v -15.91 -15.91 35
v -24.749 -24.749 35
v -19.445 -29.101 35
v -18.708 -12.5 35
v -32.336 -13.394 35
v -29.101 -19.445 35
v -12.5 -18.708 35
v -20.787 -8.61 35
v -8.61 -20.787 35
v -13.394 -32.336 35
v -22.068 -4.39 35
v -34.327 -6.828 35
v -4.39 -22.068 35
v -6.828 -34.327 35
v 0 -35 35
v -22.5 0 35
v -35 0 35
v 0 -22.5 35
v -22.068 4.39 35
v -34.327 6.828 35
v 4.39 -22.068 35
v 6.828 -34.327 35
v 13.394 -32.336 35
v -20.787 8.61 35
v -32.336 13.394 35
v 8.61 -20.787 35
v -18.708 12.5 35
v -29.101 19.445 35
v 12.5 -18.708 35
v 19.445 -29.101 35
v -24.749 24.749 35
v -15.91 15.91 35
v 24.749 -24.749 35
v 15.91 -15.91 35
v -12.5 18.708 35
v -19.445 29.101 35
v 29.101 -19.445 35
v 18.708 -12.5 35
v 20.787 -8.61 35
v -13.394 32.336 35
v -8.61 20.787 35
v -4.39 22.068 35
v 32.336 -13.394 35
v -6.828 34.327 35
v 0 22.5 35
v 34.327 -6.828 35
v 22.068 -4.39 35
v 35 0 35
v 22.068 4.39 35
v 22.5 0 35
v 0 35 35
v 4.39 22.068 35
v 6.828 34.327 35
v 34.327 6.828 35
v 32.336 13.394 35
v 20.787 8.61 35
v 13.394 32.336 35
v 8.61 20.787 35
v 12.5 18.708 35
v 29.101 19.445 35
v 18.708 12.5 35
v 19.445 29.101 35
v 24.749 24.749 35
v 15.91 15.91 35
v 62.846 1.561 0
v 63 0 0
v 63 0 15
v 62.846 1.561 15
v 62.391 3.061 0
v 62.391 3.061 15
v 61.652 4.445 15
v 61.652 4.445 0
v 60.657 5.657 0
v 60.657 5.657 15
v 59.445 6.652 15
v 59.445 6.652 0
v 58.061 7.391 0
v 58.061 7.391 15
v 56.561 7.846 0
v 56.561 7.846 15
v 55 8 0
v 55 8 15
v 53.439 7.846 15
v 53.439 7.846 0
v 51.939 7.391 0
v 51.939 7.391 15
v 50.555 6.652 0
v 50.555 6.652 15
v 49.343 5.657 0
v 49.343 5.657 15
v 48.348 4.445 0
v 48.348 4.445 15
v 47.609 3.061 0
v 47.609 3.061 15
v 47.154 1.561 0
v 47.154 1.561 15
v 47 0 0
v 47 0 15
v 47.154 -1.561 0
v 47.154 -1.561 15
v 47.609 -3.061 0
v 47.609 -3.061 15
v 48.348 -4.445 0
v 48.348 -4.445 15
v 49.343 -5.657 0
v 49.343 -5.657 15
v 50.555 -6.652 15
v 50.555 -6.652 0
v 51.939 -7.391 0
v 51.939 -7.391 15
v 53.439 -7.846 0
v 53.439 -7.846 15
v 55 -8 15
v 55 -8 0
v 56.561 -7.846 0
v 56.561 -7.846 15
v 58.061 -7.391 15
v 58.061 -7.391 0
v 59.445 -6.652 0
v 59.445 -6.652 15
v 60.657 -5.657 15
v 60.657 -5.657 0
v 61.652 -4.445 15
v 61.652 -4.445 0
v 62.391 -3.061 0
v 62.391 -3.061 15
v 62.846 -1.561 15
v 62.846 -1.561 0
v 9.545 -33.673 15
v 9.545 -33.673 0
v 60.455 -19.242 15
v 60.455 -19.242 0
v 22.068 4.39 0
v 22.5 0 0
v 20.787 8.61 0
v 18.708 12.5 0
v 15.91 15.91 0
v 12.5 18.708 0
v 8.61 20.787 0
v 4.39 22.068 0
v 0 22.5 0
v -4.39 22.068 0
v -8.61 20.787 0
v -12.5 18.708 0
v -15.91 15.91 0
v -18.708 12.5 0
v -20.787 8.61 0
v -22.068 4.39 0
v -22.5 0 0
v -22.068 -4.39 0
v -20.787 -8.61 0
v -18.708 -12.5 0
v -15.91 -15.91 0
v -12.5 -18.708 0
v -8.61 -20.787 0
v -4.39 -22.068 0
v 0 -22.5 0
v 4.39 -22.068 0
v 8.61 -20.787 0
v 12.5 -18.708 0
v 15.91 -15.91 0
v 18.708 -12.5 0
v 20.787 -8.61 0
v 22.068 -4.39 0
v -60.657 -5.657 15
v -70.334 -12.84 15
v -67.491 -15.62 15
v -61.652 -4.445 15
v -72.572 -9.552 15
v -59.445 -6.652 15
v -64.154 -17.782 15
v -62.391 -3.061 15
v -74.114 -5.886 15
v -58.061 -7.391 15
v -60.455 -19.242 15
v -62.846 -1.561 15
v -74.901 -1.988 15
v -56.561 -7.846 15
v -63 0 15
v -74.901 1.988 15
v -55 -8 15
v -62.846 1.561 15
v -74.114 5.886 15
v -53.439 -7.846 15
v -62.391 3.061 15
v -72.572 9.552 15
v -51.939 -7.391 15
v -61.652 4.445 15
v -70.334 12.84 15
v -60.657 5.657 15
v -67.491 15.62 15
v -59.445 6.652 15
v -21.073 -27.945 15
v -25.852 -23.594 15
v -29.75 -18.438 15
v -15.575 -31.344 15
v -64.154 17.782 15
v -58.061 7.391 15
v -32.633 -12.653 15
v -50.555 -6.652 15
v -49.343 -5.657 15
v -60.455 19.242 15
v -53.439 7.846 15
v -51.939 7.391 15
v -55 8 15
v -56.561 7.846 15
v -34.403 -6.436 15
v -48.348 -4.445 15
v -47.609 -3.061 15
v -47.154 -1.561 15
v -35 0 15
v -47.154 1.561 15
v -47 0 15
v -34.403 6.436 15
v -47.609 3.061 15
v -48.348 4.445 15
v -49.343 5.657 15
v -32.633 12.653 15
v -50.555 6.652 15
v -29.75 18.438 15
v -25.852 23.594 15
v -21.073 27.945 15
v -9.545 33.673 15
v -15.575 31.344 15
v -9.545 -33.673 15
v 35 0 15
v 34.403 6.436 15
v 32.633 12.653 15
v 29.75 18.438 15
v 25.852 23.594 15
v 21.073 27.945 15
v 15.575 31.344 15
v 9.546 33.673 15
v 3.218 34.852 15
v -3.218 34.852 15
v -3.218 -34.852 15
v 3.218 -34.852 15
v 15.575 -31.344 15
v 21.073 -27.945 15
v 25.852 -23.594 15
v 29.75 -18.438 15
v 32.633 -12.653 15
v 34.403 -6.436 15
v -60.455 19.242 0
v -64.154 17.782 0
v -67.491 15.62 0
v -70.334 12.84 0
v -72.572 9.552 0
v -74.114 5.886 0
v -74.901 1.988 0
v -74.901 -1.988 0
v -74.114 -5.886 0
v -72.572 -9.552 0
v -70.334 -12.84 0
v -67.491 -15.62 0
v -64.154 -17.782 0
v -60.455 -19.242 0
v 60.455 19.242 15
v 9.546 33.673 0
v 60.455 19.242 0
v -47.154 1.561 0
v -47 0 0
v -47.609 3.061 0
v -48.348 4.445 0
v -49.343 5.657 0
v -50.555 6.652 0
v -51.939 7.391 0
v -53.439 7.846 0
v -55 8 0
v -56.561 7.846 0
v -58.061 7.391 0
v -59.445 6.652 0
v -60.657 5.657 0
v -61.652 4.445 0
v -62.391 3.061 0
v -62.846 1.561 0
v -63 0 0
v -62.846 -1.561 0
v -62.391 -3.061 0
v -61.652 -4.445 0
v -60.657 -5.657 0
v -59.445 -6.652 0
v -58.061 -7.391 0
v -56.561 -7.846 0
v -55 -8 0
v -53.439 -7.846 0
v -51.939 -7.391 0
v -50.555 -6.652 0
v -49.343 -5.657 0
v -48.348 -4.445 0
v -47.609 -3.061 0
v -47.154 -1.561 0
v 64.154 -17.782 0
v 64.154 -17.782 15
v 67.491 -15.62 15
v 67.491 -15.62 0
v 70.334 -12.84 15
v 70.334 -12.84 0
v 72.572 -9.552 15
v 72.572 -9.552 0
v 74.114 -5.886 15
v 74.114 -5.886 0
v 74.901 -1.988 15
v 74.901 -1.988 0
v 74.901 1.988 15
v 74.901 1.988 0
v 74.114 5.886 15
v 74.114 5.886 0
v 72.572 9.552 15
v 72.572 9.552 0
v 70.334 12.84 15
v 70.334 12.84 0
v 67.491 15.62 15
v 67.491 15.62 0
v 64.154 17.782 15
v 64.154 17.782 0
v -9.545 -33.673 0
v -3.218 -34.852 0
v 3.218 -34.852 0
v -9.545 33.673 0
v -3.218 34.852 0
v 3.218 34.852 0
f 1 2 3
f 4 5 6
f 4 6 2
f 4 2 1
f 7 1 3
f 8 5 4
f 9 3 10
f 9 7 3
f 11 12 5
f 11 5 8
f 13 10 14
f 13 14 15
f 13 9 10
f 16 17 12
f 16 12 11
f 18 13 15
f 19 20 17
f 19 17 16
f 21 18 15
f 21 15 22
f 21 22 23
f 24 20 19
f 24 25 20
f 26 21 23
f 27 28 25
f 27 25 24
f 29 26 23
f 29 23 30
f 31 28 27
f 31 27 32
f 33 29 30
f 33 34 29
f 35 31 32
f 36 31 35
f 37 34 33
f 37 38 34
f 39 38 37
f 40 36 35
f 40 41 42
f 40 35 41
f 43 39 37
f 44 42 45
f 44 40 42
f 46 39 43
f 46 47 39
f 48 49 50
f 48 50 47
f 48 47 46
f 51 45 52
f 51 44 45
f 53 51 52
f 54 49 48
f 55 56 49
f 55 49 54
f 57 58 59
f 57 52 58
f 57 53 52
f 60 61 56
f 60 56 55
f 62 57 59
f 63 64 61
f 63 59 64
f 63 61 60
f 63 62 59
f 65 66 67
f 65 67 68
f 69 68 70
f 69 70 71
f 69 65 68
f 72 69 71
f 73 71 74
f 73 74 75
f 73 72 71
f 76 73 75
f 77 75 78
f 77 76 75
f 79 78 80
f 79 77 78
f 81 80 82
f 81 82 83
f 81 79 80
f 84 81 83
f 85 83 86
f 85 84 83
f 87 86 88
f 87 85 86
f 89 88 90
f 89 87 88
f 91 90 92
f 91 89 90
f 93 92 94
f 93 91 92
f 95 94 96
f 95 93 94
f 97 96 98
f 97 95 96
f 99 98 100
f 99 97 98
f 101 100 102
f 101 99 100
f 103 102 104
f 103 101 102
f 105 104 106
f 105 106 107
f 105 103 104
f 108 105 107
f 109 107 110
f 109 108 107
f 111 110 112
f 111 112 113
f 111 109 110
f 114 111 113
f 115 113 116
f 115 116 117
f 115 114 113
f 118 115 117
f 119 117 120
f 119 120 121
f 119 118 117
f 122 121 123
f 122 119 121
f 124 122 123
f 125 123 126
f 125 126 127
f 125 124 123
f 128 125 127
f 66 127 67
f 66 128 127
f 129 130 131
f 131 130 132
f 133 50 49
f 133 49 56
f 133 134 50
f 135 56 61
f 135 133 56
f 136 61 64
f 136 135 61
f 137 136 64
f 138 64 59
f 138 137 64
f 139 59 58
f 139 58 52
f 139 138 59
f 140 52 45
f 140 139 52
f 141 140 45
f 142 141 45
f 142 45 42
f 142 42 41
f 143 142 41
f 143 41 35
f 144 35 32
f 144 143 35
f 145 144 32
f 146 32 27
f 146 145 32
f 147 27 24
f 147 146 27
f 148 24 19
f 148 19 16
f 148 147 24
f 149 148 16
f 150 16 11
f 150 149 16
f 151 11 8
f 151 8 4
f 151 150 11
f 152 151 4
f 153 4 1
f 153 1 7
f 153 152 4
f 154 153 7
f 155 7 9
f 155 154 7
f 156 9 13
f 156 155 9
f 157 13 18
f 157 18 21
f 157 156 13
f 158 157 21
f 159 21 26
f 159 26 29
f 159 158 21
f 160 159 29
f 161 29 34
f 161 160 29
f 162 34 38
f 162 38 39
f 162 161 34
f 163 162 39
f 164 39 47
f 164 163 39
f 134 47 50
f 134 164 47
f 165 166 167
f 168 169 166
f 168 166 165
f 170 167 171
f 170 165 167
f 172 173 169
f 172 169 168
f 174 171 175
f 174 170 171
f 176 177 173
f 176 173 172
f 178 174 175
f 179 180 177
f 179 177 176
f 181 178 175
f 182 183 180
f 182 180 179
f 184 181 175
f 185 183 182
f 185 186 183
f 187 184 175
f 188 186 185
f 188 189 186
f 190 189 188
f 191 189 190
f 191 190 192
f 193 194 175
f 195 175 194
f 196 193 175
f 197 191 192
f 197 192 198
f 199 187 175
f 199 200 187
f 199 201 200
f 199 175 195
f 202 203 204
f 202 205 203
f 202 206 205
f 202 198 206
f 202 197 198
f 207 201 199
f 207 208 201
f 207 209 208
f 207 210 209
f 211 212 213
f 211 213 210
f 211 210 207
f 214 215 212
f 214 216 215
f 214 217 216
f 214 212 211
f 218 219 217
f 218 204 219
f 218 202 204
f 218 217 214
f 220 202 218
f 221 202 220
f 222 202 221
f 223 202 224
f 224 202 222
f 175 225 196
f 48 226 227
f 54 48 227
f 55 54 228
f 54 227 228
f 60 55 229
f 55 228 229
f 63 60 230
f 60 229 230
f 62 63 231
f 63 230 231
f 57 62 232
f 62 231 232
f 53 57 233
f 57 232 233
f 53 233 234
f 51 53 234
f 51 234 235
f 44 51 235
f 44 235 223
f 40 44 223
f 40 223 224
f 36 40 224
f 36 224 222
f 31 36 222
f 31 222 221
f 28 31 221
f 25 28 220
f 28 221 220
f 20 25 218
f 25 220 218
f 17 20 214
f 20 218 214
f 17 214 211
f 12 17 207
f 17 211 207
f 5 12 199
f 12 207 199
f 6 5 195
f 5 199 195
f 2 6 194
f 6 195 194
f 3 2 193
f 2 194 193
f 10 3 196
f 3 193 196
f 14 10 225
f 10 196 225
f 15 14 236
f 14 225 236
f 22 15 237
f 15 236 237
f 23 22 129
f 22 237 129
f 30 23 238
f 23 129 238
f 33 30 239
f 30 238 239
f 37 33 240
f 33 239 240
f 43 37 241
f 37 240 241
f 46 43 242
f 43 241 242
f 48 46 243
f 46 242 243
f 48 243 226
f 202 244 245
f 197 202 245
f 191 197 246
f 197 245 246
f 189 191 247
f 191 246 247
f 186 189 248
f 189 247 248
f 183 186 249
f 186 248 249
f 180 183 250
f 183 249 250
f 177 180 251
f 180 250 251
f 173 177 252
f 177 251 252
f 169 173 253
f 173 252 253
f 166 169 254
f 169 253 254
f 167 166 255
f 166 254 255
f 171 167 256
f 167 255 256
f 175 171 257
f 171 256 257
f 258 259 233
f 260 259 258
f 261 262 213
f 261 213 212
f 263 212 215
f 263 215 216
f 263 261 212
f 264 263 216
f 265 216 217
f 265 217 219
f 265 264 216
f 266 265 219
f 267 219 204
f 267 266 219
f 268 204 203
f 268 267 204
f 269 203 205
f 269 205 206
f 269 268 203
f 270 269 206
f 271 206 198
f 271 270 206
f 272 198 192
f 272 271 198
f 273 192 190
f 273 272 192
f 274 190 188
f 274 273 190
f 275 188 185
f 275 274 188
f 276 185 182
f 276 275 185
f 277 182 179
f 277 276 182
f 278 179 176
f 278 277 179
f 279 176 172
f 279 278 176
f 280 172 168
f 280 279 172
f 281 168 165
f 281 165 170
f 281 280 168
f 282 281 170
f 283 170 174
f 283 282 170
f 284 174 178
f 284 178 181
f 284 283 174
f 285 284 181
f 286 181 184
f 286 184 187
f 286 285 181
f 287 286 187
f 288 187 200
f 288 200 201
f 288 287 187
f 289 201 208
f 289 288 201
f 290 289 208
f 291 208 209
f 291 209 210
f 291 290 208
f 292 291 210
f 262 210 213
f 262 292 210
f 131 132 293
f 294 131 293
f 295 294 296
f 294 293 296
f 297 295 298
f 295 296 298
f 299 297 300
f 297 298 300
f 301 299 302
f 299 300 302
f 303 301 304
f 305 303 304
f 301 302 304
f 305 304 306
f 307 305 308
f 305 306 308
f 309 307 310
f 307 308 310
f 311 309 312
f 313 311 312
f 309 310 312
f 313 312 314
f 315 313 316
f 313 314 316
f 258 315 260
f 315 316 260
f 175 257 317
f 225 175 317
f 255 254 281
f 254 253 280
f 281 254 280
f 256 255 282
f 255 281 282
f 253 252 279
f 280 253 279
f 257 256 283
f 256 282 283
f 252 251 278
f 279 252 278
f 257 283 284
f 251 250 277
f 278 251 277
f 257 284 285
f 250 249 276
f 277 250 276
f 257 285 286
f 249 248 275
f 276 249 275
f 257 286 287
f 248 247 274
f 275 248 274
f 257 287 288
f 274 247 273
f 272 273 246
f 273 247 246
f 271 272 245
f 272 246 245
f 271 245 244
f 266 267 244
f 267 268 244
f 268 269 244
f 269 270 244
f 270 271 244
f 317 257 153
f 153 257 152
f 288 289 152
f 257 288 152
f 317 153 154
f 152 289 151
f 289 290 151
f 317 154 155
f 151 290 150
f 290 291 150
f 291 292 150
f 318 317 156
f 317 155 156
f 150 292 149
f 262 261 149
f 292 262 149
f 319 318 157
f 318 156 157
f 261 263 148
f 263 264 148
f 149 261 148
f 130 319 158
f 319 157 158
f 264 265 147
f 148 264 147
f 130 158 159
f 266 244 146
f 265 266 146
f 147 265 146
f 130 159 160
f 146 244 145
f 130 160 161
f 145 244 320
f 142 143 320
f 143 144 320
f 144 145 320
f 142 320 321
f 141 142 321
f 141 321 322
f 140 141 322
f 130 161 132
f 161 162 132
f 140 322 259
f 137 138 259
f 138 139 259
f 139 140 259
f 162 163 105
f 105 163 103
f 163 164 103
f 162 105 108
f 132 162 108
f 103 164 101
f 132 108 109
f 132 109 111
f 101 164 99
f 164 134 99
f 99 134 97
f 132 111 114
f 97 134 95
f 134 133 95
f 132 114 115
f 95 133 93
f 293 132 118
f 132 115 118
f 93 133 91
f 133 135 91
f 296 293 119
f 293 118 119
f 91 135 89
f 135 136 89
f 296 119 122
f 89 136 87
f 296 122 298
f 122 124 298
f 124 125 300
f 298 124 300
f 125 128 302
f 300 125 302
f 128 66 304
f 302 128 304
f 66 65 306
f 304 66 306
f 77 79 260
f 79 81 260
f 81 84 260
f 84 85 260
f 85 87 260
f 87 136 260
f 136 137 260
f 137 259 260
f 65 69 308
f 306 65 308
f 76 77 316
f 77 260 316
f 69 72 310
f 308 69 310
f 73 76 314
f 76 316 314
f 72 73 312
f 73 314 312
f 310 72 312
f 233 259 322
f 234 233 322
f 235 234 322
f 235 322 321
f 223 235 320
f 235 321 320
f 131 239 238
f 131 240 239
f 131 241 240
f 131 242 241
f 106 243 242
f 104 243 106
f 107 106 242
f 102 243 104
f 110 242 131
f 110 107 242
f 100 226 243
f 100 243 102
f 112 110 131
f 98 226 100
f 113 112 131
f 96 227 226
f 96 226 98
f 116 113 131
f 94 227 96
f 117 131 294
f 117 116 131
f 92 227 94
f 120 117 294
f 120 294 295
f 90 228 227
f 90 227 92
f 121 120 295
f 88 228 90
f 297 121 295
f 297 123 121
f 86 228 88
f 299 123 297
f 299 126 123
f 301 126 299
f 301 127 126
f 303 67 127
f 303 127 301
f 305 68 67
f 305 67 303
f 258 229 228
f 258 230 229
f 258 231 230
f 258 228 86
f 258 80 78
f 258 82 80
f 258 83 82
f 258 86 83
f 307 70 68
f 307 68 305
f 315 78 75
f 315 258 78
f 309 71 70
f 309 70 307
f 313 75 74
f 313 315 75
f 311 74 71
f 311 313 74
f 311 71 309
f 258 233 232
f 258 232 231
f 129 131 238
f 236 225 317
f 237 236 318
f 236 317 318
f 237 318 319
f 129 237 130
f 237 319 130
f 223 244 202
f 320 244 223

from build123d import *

# Parameters (mm, degrees)
SKETCH_R      = 22.5
SKETCH_R_2    = 8
PAD_DEPTH     = 15
SKETCH002_R   = 35
SKETCH002_R_2 = 22.5
PAD001_DEPTH  = 20


with BuildPart() as part:
    # Sketch → Pad (new body)
    with BuildSketch(Plane.XY):
        with BuildLine():
            ThreePointArc((9.5455310911, 33.6731768057), (3.97682e-05, 35), (-9.5454545699, 33.6731984975))
            Line((-60.4545457907, 19.2418276215), (-9.5454545698, 33.6731984975))
            ThreePointArc((-60.4545457907, 19.2418276215), (-75, -1.844e-07), (-60.4545454359, -19.2418277221))
            Line((-60.4545454359, -19.2418277221), (-9.5454544023, -33.673198545))
            ThreePointArc((-9.5454544023, -33.673198545), (3.842e-07, -35), (9.5454551416, -33.6731983355))
            Line((9.5454551416, -33.6731983355), (60.4545455403, -19.2418276925))
            ThreePointArc((60.4545455403, -19.2418276925), (75, 6.189e-07), (60.4545443494, 19.2418280301))
            Line((9.5455310911, 33.6731768057), (60.4545443495, 19.2418280301))
        make_face()
        Circle(SKETCH_R, mode=Mode.SUBTRACT)
        with Locations((-55, 0)):
            Circle(SKETCH_R_2, mode=Mode.SUBTRACT)
        with Locations((55, 0)):
            Circle(SKETCH_R_2, mode=Mode.SUBTRACT)
    extrude(amount=PAD_DEPTH)

    # Sketch002 → Pad001 (new body)
    with BuildSketch(Plane.XY.offset(15)):
        Circle(SKETCH002_R)
        Circle(SKETCH002_R_2, mode=Mode.SUBTRACT)
    extrude(amount=PAD001_DEPTH)


solid = part.part
